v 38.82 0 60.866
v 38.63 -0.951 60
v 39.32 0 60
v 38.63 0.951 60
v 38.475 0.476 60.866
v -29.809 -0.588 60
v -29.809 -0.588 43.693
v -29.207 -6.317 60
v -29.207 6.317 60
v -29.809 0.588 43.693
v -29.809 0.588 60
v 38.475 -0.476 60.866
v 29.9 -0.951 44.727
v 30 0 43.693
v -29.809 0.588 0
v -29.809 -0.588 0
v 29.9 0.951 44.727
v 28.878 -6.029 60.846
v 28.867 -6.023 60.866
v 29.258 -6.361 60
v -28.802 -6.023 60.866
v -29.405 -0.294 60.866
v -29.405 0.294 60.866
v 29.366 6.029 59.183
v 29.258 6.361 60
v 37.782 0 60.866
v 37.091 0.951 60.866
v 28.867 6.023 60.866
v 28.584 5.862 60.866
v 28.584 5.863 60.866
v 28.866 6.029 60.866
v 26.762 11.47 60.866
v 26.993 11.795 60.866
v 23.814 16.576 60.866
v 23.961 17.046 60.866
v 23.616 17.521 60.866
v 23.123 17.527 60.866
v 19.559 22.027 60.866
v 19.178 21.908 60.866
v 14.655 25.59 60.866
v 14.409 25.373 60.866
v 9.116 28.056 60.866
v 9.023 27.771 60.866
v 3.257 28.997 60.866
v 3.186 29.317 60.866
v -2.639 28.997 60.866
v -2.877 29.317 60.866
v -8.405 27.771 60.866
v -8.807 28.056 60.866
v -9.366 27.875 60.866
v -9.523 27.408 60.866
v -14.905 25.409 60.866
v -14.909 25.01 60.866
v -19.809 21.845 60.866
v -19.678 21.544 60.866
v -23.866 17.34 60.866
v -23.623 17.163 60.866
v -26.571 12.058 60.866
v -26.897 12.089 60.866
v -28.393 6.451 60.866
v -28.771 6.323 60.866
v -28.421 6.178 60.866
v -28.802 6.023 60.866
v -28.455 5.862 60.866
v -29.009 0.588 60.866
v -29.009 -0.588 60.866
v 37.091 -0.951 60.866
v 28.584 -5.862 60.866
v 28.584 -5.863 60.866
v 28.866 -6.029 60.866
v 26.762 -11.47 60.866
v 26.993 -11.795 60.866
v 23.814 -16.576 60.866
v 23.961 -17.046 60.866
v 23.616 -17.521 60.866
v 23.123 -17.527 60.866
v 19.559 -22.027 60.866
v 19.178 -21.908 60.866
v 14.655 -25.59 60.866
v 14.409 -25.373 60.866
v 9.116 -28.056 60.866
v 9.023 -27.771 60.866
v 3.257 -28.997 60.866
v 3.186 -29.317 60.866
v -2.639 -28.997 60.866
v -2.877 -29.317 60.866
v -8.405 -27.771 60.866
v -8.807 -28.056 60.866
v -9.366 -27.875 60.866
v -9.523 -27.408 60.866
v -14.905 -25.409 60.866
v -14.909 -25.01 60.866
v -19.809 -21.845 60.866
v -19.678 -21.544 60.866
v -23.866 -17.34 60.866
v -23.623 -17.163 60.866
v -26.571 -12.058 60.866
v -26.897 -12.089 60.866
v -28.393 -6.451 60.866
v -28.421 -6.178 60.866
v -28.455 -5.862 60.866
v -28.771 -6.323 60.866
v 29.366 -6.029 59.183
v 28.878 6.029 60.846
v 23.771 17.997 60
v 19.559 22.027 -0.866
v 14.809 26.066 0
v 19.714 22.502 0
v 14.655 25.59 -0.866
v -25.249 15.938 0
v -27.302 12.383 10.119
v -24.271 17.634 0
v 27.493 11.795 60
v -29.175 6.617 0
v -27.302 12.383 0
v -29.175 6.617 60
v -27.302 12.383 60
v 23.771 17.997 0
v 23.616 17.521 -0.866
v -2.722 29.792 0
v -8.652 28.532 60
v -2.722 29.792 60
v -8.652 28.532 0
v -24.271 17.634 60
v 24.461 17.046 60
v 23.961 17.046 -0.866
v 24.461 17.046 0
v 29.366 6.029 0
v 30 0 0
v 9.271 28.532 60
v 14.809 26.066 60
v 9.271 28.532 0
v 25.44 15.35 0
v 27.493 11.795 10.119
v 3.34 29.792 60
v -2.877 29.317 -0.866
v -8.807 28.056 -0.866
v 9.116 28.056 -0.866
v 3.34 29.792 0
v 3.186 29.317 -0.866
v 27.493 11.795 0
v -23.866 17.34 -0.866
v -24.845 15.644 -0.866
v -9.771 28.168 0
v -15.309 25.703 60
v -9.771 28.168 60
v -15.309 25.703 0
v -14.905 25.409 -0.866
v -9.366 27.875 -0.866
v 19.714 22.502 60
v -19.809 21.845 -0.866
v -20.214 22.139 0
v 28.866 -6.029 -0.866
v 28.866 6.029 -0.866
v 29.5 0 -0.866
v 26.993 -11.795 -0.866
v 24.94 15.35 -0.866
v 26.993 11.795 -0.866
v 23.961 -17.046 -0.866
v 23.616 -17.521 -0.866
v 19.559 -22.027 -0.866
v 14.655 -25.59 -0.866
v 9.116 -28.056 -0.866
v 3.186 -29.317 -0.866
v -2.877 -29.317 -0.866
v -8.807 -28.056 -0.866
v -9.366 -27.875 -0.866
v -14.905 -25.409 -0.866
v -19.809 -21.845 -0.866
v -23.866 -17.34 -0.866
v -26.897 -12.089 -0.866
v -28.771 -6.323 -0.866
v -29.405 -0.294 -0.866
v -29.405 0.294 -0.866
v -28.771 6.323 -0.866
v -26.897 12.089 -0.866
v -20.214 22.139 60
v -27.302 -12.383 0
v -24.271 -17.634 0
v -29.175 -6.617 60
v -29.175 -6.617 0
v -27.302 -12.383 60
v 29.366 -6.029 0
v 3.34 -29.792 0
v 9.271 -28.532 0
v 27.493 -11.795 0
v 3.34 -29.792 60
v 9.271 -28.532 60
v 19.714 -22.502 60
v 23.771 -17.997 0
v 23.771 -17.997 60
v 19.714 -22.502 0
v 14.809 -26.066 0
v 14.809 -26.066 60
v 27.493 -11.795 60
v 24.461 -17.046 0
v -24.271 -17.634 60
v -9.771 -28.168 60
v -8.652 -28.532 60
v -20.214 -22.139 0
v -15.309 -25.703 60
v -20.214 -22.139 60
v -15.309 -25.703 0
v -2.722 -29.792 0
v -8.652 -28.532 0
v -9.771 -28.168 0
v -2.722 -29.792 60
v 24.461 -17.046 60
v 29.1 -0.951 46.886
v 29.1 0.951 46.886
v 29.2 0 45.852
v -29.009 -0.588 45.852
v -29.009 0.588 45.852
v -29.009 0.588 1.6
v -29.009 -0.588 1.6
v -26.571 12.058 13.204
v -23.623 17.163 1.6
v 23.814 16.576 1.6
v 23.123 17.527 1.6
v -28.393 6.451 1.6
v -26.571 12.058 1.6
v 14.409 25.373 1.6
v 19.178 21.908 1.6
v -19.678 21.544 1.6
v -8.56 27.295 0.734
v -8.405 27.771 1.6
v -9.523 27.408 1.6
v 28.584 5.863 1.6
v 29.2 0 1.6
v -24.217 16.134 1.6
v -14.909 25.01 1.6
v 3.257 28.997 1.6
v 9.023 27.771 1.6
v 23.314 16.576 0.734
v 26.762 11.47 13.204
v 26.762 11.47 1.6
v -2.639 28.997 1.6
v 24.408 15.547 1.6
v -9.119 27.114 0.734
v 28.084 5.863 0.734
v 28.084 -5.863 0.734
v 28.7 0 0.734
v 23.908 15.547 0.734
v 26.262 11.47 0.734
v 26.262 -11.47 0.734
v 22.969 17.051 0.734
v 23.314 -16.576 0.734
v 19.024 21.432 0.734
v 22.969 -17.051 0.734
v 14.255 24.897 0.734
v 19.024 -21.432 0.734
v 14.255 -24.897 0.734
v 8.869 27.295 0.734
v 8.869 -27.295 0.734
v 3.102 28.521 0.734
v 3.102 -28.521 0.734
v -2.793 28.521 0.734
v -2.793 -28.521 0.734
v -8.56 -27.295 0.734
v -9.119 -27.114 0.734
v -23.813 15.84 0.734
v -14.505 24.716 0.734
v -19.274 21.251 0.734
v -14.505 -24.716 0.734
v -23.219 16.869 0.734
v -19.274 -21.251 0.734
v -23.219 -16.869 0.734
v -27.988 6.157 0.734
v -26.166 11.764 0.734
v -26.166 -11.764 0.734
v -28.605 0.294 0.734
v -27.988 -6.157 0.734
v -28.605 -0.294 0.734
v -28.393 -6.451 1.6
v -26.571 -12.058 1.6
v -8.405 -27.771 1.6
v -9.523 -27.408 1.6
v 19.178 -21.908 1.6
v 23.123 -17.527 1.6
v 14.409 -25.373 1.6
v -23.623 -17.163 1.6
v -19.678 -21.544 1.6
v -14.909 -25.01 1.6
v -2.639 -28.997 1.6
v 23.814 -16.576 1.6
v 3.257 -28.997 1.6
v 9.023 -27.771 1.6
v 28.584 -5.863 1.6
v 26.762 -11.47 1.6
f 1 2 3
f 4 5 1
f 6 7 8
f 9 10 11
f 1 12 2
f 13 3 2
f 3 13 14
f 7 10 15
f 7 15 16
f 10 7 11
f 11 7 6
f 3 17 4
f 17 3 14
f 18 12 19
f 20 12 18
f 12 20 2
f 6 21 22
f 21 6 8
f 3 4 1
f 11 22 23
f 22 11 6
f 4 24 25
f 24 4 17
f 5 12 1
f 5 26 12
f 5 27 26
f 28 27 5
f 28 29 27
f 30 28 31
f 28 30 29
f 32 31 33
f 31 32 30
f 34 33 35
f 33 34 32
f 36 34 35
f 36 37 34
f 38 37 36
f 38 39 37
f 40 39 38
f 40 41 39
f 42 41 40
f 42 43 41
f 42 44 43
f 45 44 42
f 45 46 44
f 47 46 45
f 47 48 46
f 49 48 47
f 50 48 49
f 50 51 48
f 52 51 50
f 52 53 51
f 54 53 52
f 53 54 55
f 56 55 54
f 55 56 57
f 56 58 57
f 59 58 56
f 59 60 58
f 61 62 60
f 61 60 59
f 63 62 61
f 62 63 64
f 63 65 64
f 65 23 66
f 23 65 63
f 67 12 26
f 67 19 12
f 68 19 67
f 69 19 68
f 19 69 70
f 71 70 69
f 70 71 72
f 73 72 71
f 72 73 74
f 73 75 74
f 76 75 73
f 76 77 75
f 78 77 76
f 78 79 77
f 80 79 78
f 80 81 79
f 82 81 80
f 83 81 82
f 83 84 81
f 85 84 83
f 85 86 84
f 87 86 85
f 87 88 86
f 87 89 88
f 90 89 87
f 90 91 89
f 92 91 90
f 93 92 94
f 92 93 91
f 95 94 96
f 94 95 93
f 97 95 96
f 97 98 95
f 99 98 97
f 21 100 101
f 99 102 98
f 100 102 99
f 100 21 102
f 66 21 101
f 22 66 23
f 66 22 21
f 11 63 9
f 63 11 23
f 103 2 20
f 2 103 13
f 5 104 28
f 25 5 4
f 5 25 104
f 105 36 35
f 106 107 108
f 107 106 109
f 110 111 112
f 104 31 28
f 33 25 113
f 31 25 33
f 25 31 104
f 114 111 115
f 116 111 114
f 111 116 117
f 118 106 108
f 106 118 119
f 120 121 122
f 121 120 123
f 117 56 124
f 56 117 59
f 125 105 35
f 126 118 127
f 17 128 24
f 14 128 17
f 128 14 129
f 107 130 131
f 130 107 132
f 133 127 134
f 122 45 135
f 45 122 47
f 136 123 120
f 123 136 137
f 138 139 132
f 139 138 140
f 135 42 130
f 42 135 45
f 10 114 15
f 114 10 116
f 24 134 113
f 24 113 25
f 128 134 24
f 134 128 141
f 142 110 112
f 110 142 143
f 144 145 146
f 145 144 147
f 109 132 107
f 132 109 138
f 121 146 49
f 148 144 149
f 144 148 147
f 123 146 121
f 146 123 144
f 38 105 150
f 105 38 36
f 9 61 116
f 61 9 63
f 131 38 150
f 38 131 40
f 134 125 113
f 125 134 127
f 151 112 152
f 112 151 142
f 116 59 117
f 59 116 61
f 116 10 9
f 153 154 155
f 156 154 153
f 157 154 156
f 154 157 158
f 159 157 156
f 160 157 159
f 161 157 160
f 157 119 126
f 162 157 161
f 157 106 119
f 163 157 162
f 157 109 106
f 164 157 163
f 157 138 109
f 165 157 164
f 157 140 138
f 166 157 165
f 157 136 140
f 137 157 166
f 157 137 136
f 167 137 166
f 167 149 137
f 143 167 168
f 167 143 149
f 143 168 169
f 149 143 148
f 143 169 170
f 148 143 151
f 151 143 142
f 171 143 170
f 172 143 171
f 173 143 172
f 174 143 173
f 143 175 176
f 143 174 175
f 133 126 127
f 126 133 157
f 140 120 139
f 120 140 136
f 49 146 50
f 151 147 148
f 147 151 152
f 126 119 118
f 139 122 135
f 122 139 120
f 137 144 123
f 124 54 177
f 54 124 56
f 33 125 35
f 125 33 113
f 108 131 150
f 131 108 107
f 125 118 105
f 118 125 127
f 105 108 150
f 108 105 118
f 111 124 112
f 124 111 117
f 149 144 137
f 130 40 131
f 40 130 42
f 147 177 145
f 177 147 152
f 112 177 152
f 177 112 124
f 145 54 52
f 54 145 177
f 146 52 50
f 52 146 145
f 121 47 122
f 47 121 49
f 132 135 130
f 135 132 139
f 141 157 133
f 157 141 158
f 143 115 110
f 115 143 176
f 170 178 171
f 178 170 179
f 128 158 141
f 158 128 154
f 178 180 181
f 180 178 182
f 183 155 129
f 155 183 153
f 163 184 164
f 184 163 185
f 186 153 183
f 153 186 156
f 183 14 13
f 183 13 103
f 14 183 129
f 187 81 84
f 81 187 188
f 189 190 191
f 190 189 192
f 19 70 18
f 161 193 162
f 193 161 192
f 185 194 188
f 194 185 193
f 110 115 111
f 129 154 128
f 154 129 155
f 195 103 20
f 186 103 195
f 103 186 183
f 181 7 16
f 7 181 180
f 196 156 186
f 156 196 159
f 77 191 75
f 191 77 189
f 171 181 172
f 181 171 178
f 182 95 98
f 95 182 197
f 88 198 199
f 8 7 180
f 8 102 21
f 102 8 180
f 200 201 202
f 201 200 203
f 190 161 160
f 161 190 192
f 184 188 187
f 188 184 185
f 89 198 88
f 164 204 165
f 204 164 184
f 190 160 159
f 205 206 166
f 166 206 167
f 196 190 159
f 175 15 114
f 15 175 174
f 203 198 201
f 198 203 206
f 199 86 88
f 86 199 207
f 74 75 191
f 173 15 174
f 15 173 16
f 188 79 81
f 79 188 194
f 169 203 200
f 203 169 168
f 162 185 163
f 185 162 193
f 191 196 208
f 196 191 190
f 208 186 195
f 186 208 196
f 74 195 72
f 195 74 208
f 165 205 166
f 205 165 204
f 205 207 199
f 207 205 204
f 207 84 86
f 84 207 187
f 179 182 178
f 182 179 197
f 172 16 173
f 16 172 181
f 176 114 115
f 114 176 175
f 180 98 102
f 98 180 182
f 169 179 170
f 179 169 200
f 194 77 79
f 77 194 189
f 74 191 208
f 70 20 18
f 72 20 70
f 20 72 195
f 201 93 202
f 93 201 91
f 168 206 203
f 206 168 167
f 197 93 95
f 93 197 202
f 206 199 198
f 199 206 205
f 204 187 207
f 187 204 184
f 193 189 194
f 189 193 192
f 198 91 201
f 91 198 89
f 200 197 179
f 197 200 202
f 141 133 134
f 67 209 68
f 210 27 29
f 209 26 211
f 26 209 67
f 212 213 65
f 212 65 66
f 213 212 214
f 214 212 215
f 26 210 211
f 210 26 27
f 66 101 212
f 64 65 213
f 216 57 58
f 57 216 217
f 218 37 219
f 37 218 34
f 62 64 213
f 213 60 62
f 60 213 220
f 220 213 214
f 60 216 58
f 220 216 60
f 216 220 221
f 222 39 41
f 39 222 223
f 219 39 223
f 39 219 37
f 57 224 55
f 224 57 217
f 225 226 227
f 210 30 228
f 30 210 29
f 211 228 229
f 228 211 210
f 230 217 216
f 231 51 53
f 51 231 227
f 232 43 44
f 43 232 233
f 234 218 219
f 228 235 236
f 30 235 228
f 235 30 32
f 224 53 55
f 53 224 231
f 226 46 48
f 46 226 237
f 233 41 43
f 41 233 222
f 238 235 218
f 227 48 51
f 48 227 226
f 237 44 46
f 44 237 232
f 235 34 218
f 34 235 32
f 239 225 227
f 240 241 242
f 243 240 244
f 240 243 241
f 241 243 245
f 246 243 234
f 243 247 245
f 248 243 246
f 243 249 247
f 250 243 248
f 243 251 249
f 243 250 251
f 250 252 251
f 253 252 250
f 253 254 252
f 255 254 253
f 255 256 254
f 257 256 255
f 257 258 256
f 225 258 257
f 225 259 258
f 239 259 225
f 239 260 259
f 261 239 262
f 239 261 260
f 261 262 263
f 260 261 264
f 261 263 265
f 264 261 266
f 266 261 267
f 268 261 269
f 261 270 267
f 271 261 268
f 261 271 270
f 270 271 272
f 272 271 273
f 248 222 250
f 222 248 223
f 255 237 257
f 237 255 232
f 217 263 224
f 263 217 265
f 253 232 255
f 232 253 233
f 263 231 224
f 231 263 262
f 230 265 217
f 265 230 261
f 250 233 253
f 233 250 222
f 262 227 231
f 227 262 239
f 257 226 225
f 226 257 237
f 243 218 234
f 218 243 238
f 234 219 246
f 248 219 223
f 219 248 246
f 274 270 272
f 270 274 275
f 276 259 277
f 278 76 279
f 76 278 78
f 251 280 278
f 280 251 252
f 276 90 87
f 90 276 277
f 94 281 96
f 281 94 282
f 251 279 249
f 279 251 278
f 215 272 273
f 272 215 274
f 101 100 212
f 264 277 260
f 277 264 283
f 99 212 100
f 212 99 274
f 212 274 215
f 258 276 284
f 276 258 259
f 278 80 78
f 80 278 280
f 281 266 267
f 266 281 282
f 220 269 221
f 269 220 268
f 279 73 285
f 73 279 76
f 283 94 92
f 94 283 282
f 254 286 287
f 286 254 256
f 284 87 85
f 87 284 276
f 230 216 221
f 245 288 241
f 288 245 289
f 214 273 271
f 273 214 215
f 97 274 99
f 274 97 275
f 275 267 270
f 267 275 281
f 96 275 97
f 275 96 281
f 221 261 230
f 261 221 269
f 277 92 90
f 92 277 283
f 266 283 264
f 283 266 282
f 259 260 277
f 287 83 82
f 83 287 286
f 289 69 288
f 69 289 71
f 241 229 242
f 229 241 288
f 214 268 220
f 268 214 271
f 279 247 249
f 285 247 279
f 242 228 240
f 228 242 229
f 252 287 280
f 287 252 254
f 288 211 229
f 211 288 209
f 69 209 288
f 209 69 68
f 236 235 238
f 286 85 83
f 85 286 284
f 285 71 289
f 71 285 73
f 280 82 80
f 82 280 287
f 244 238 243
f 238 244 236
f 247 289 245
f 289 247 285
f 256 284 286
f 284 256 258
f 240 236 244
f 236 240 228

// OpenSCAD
beaker_diameter = 60;
beaker_total_height=60;
spout_cord=40;
spout_height=30;
smooth=2;
wall=1.6;

function sagita(rad,arch) = rad - sqrt(pow(rad,2)-pow(arch/2,2));

/*
circle(d=beaker_diameter);
translate([beaker_diameter/2+spout_cord*sqrt(3)/12-sagita(beaker_diameter/2,spout_cord),0,0])circle(d=spout_cord/sqrt(3),$fn=3);
*/


module spout(spout_cord,spout_height,smooth){
    r=spout_cord-smooth;
    translate([0,0,spout_height])
    mirror([0,0,1])
    linear_extrude(height = spout_height, convexity = 10, scale=0.01)
     translate([r*sqrt(3)/12+smooth,0,0])
    offset(r=smooth)
    circle(d=r/sqrt(3),$fn=3);
}

//spout(spout_cord,spout_height,smooth,$fn=20);

module basic_shape(beaker_diameter,beaker_total_height,spout_cord,spout_height){
    cylinder(d=beaker_diameter,h=beaker_total_height);
    intersection(){
    translate(
        [beaker_diameter/2-sagita(beaker_diameter/2,spout_cord),
         0,
          beaker_total_height-spout_height])
    spout(spout_cord,spout_height,0);
    cylinder(d=beaker_diameter+spout_cord,h=beaker_total_height);
    }
}

difference(){
minkowski()
{
    basic_shape(beaker_diameter-smooth,beaker_total_height,spout_cord,spout_height);
    sphere(d=smooth);
}
translate([0,0,wall])
minkowski()
{
    basic_shape(beaker_diameter-smooth-wall,beaker_total_height,spout_cord,spout_height);
    sphere(d=smooth);
}
}
